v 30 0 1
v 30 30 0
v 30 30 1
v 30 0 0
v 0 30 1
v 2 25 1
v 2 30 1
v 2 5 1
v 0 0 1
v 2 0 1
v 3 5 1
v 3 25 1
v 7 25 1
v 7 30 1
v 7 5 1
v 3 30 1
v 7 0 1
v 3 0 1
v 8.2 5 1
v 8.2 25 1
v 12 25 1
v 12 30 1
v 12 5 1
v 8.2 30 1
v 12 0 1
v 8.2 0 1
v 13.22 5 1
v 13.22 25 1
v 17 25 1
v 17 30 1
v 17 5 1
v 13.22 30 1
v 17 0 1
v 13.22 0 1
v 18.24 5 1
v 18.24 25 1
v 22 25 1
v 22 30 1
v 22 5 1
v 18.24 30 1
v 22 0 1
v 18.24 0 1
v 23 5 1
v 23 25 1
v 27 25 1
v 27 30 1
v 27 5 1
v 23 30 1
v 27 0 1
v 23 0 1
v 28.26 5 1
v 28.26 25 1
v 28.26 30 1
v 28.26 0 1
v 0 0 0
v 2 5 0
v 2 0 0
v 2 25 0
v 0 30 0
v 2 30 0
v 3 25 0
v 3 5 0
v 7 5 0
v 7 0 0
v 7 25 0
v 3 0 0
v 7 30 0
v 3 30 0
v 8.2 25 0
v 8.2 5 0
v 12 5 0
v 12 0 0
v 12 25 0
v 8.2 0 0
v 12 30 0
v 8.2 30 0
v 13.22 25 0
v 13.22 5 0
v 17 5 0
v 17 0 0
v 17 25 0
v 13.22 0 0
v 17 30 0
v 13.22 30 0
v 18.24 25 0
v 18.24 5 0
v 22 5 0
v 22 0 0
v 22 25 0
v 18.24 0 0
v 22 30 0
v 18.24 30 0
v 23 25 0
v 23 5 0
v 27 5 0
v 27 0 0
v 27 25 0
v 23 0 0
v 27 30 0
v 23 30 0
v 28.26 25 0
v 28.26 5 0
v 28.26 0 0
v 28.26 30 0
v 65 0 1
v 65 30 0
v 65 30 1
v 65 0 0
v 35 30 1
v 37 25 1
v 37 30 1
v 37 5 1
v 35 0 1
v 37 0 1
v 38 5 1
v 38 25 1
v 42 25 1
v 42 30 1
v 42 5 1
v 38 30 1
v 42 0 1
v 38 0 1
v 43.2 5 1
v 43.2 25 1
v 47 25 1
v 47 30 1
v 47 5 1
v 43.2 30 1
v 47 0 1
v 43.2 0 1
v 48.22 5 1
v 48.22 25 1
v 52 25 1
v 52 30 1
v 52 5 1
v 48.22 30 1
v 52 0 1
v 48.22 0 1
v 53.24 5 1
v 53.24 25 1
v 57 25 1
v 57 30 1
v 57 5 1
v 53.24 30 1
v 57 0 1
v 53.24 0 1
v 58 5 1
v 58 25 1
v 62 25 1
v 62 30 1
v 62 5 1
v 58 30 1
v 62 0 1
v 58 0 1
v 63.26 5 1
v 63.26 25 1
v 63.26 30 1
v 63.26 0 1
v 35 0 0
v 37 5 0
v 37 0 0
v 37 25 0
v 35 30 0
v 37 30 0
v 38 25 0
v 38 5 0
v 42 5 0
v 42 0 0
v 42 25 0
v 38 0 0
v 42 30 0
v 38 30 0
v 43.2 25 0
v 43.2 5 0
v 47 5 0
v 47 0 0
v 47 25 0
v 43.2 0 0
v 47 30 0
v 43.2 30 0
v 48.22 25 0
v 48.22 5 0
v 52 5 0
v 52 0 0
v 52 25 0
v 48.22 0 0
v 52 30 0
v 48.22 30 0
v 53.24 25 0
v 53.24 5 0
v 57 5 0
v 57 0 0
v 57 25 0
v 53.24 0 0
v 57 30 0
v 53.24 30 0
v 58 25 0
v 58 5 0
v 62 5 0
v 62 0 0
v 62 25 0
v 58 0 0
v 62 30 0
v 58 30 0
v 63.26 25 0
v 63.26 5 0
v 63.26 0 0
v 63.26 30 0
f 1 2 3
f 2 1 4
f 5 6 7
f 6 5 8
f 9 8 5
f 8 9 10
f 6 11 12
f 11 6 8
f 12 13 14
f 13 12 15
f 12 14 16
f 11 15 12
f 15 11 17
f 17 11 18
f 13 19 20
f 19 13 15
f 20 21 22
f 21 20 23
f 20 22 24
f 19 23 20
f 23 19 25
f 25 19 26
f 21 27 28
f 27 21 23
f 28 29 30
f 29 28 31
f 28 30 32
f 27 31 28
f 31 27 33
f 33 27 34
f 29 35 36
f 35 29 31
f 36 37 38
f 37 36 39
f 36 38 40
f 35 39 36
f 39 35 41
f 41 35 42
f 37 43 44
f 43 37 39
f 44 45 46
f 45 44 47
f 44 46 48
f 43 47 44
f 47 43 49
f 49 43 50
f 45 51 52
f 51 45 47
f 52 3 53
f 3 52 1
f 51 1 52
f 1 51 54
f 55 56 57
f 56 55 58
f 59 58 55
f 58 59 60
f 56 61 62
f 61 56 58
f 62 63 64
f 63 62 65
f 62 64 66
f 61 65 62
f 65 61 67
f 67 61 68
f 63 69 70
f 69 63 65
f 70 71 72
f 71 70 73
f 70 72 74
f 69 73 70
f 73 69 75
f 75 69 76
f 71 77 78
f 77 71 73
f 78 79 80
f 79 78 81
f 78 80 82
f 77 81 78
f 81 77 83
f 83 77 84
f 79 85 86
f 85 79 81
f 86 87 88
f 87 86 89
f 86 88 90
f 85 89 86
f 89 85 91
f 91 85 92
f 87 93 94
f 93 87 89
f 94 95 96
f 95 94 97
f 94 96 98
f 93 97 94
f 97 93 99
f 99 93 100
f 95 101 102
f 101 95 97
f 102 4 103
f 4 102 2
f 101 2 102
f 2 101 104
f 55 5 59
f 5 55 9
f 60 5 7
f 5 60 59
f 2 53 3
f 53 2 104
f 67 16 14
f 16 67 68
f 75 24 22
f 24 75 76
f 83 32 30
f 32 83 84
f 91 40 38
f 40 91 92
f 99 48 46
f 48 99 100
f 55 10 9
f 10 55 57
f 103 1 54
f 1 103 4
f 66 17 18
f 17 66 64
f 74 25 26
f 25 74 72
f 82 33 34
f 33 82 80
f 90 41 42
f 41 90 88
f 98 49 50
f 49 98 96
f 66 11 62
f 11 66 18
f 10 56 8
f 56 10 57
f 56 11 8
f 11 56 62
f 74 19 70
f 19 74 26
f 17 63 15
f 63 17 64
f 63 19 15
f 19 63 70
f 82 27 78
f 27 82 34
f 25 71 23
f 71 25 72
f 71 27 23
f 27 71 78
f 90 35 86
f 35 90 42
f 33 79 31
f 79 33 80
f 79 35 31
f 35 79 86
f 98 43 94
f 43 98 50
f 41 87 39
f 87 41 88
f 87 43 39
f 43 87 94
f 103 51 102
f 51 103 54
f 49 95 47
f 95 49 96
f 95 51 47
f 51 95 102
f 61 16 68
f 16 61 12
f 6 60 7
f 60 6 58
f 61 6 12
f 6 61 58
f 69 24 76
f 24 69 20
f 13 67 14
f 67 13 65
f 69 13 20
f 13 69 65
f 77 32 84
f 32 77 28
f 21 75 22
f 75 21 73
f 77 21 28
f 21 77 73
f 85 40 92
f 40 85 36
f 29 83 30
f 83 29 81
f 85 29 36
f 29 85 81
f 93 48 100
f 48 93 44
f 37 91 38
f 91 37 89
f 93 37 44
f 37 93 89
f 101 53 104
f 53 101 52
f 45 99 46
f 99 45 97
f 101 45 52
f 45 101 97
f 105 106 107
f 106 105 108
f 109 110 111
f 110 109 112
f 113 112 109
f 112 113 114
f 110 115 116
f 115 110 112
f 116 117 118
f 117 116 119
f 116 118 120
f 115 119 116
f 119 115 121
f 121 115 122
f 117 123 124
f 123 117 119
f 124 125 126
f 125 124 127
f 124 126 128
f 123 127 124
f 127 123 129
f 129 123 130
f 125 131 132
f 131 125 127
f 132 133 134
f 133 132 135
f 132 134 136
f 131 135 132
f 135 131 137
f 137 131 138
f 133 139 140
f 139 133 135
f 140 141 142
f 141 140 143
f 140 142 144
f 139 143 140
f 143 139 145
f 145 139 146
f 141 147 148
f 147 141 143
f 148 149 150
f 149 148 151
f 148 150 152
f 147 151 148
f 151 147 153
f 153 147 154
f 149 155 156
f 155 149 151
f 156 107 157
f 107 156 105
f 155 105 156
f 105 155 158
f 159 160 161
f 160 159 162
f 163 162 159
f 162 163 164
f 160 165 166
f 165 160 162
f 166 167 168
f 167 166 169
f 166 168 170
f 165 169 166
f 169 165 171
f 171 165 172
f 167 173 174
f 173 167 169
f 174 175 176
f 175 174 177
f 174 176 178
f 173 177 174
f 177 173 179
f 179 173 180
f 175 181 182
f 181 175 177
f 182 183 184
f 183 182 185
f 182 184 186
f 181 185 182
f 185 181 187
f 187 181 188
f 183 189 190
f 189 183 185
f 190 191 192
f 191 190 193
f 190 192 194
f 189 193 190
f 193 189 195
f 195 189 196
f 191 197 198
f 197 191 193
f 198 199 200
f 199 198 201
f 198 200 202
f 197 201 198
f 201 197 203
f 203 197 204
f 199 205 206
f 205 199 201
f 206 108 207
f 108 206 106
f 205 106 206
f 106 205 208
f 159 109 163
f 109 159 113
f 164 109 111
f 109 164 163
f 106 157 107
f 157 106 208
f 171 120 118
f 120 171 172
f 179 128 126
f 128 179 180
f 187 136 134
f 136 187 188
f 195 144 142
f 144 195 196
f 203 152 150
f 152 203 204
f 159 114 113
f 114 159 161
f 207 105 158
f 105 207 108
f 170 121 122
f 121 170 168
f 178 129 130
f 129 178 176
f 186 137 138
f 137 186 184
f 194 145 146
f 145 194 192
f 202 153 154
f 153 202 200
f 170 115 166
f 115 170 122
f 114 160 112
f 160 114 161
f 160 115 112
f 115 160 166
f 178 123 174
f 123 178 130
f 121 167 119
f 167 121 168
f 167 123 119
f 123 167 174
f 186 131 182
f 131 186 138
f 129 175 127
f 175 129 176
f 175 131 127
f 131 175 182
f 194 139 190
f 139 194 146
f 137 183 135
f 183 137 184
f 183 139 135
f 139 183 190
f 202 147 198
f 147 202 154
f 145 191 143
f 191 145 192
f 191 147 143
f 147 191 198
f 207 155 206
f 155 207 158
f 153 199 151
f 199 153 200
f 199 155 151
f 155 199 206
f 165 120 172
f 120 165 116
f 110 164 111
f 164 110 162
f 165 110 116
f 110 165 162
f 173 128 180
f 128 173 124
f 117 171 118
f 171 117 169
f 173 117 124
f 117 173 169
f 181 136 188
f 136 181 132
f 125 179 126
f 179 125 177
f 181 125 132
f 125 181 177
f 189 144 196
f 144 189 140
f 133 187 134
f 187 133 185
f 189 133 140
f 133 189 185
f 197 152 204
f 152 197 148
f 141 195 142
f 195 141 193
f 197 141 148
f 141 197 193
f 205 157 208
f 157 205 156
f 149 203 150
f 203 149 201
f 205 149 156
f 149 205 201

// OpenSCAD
$inch = 25.4;
$half = $inch/2;
$quarter = $inch/4;
$eigth = $inch/8;
$sixteenth = $inch/16;
$thirtysecondth = $inch/32;

$slot_width = 1;
$slot_length = 5 + 1; // offset to always use.

$depth = 1;
$start = 2;

$sq_side=30;

$fn=128;
$2d = 0; // set "$2d = 1;" for profiles

module make_slotted_flat () {
    difference () {
       cube([$sq_side,$sq_side, $depth]);
       translate([$start,-1,-0.1]) {
          cube([$slot_width,
                $slot_length,$depth + 0.2]);
       }
       translate([$start+5,-1,-0.1]) {
          cube([$slot_width + (0.2),
                $slot_length,$depth + 0.2]);
       }
       translate([$start+10,-1,-0.1]) {
          cube([$slot_width + 0.22,
                $slot_length,$depth + 0.2]);
       }
       translate([$start+15,-1,-0.1]) {
          cube([$slot_width + 0.24,
                $slot_length,$depth + 0.2]);
       }
       translate([$start+20,-1,-0.1]) {
          cube([$slot_width,
                $slot_length,$depth + 0.2]);
       }
       translate([$start+25,-1,-0.1]) {
          cube([$slot_width+0.26,
                $slot_length,$depth + 0.2]);
       }
// far side
       translate([$start,$sq_side - $slot_length+1,-0.1]) {
          cube([$slot_width,
                $slot_length,$depth + 0.2]);
       }
       translate([$start+5,$sq_side - $slot_length+1,-0.1]) {
          cube([$slot_width + (0.2),
                $slot_length,$depth + 0.2]);
       }
       translate([$start+10,$sq_side - $slot_length+1,-0.1]) {
          cube([$slot_width + 0.22,
                $slot_length,$depth + 0.2]);
       }
       translate([$start+15,$sq_side - $slot_length+1,-0.1]) {
          cube([$slot_width + 0.24,
                $slot_length,$depth + 0.2]);
       }
       translate([$start+20,$sq_side - $slot_length+1,-0.1]) {
          cube([$slot_width,
                $slot_length,$depth + 0.2]);
       }
       translate([$start+25,$sq_side - $slot_length+1,-0.1]) {
          cube([$slot_width + 0.26,
                $slot_length,$depth + 0.2]);
       }
    }
}

module make_parts() {

    translate([0,0,0]) {
        make_slotted_flat();
    }
    translate([$sq_side+5,0,0]) {
        make_slotted_flat();
    }
}


if ($2d) {
    projection(cut=true) {
       translate([0,0,0]) rotate([0,0,0]) {
         make_parts();
       }
}
} else {
    make_parts();
//  for measuring and calibrating
//    translate([60,40,0]) {
//      cube([20,5,1]);
//    }
}
